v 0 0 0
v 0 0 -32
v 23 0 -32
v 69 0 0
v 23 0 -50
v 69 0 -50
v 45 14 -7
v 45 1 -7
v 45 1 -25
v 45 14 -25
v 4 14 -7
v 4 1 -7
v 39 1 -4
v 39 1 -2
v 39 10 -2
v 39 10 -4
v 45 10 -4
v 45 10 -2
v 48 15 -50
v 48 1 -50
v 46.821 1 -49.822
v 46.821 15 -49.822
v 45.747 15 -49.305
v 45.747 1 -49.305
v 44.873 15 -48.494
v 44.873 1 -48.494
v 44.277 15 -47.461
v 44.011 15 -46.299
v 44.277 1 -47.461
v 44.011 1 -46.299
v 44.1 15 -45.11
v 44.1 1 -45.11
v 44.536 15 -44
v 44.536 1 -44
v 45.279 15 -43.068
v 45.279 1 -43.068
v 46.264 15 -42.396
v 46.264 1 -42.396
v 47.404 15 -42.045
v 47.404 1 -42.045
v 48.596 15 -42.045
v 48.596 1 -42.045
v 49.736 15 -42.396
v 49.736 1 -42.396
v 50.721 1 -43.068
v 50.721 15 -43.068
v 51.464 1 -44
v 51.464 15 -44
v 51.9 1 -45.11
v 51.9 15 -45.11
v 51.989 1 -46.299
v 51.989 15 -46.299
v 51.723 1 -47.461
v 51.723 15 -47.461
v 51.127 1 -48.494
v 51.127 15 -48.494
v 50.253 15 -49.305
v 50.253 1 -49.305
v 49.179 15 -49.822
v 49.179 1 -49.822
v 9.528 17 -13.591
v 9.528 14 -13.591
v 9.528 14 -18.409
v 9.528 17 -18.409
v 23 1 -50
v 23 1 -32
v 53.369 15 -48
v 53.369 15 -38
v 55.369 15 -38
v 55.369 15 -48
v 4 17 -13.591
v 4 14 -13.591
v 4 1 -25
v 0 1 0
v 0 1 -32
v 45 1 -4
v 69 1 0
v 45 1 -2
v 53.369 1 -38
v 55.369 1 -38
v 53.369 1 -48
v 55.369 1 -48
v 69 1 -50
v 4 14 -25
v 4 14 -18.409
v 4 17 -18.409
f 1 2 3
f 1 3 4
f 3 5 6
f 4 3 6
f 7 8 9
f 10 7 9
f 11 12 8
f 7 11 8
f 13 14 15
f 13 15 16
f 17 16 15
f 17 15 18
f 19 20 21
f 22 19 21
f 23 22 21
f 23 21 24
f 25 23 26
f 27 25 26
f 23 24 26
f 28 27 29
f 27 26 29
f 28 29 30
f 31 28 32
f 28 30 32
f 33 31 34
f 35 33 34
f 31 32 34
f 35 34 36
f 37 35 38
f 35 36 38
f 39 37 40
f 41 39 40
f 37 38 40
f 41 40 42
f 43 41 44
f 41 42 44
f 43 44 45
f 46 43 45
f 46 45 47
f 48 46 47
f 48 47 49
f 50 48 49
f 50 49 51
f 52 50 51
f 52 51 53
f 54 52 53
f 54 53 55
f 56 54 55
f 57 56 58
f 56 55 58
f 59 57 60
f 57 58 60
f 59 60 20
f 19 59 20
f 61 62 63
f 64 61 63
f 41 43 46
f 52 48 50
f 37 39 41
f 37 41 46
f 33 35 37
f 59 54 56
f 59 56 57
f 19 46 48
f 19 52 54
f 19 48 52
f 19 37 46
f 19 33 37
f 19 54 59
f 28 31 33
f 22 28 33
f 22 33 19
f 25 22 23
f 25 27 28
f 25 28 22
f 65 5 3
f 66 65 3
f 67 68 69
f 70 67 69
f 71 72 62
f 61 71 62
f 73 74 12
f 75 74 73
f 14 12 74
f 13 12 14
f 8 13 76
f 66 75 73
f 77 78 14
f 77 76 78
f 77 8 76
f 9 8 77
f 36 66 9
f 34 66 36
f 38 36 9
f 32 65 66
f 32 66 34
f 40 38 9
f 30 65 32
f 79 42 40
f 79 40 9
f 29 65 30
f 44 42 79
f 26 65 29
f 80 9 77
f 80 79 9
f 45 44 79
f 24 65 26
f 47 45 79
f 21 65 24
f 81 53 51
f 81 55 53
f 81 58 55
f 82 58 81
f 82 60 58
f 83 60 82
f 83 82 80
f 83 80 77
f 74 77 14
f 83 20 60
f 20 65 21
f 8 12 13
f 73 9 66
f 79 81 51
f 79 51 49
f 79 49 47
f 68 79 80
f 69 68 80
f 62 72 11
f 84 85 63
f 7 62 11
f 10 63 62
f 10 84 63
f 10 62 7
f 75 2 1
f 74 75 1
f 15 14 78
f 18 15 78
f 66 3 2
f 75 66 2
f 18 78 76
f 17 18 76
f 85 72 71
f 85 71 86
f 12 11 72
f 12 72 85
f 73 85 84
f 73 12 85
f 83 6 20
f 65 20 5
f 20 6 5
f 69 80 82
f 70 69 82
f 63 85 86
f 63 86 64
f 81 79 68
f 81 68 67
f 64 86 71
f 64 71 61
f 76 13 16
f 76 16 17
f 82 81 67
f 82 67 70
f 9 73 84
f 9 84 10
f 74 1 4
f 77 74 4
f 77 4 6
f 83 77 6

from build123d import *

# Parameters (mm, degrees)
BOSS_EXTRUDE1_DEPTH = 1
SKETCH3_W           = 41
SKETCH3_H           = 18
BOSS_EXTRUDE2_DEPTH = 13
SKETCH4_W           = 5.527991342
SKETCH4_H           = 4.817179588
BOSS_EXTRUDE3_DEPTH = 3
SKETCH5_W           = 6
SKETCH5_H           = 2
BOSS_EXTRUDE4_DEPTH = 9
SKETCH6_R           = 4
BOSS_EXTRUDE5_DEPTH = 14
SKETCH7_W           = 2
SKETCH7_H           = 10
BOSS_EXTRUDE6_DEPTH = 14


with BuildPart() as part:
    # Sketch2 → Boss-Extrude1 (new body)
    with BuildSketch(Plane(origin=(0, 0, 0), x_dir=(1, 0, 0), z_dir=(0, 1, 0))):
        Polygon((0, 32), (0, 0), (69, 0), (69, 50), (23, 50), (23, 32), align=None)
    extrude(amount=BOSS_EXTRUDE1_DEPTH)

    # Sketch3 → Boss-Extrude2 (add)
    with BuildSketch(Plane(origin=(0, 1, 0), x_dir=(1, 0, 0), z_dir=(0, 1, 0))):
        with Locations((24.5, 16)):
            Rectangle(SKETCH3_W, SKETCH3_H)
    extrude(amount=BOSS_EXTRUDE2_DEPTH)

    # Sketch4 → Boss-Extrude3 (add)
    with BuildSketch(Plane(origin=(0, 14, 0), x_dir=(1, 0, 0), z_dir=(0, 1, 0))):
        with Locations((6.763995671, 16)):
            Rectangle(SKETCH4_W, SKETCH4_H)
    extrude(amount=BOSS_EXTRUDE3_DEPTH)

    # Sketch5 → Boss-Extrude4 (add)
    with BuildSketch(Plane(origin=(0, 1, 0), x_dir=(1, 0, 0), z_dir=(0, 1, 0))):
        with Locations((42, 3)):
            Rectangle(SKETCH5_W, SKETCH5_H)
    extrude(amount=BOSS_EXTRUDE4_DEPTH)

    # Sketch6 → Boss-Extrude5 (add)
    with BuildSketch(Plane(origin=(0, 1, 0), x_dir=(1, 0, 0), z_dir=(0, 1, 0))):
        with Locations(Location((48, 46, 0), (0, 0, 90))):
            Circle(SKETCH6_R)
    extrude(amount=BOSS_EXTRUDE5_DEPTH)

    # Sketch7 → Boss-Extrude6 (add)
    with BuildSketch(Plane(origin=(0, 1, 0), x_dir=(1, 0, 0), z_dir=(0, 1, 0))):
        with Locations((54.368547089, 43)):
            Rectangle(SKETCH7_W, SKETCH7_H)
    extrude(amount=BOSS_EXTRUDE6_DEPTH)


solid = part.part
